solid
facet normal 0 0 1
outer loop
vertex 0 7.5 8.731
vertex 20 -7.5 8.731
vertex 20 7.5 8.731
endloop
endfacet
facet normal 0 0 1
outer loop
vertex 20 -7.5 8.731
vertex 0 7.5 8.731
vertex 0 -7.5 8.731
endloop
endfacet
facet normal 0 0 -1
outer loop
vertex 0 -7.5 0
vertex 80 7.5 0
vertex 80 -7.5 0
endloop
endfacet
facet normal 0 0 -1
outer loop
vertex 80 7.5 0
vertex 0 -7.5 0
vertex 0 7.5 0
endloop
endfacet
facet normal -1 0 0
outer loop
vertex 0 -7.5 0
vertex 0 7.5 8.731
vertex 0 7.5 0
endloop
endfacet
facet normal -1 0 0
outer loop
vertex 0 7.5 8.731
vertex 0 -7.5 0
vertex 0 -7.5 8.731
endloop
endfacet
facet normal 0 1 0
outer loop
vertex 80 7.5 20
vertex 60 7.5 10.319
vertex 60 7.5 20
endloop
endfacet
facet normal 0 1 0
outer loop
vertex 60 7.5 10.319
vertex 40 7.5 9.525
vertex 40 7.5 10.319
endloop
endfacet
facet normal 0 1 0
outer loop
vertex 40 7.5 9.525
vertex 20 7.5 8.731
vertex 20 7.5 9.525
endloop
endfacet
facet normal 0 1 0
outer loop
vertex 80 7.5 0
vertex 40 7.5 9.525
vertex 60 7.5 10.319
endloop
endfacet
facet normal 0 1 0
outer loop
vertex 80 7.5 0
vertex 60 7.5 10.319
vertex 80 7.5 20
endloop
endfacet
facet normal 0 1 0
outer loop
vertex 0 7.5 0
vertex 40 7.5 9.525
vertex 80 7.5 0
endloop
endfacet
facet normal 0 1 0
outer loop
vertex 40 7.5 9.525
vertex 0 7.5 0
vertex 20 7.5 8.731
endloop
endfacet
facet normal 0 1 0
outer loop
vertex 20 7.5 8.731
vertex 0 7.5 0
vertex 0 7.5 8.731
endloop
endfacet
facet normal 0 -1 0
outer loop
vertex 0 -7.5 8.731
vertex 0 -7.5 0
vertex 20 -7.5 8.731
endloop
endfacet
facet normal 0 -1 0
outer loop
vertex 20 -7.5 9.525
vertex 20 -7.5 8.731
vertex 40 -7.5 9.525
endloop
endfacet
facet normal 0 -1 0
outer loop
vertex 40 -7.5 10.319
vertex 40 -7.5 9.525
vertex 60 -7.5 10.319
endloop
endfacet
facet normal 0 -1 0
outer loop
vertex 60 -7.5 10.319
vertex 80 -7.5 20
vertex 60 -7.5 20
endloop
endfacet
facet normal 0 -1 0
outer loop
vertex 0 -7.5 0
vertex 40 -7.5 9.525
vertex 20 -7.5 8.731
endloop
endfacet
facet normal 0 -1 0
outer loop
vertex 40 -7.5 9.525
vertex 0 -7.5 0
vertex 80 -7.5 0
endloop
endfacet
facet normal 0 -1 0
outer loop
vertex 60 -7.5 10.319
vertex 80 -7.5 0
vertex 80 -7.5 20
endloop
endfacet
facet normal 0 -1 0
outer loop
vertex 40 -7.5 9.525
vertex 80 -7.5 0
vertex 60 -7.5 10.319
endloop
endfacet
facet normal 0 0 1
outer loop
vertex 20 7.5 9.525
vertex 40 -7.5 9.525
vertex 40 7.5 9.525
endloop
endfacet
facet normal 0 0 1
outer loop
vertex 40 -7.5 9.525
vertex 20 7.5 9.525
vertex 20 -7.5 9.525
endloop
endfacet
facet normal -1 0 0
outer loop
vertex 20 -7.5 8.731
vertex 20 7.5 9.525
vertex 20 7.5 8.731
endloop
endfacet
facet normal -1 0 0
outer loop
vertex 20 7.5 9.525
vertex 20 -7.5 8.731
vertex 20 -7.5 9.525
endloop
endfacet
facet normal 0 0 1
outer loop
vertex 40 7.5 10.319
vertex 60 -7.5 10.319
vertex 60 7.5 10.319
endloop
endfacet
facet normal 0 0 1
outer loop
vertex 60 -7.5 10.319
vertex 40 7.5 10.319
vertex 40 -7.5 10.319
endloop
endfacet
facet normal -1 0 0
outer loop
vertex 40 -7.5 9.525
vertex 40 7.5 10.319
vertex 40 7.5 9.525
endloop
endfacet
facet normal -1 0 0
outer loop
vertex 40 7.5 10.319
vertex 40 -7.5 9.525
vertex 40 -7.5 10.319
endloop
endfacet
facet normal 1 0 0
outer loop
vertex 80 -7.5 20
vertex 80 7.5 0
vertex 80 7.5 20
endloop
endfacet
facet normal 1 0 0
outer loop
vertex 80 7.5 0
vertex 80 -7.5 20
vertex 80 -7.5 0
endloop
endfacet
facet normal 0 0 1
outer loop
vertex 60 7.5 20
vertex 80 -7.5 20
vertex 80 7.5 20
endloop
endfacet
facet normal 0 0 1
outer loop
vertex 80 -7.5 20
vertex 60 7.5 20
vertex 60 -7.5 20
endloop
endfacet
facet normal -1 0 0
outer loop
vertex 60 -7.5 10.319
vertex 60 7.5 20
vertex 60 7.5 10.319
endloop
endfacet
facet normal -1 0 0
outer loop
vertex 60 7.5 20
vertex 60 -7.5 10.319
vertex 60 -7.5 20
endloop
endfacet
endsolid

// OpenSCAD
// file: ../lib/common.scad
// Shared helpers for the AR turntable part models.
//
// Every part file holds a parameter table P. Each row is:
//   [id, description, value_mm, evidence, display_unit, source_or_how_to_check]
//
// Evidence codes:
//   F  factory document          O  owner report
//   C  community drawing         S  industry standard
//   D  design choice             M  measured for this repository
//   DV derived from cited sources, not yet verified on a part. The source
//      column holds the derivation: the formula, each input with its source,
//      and how to verify. Drawn in blue. Needs a row in TO-CONFIRM.md whose
//      value starts with "Derived:". Change to M once measured.
//   PH placeholder: chosen only so the model has a shape. It is NOT a
//      measurement. Drawn in red. Replace it, and change the code, once it
//      is measured.
//
// Every part file also emits metadata naming the part page, the part, the
// version, the material and the tables it fits, each fit with its evidence:
//   ["part", "parts/counterweight.md"], ["part_name", "Counterweight"],
//   ["version", "XA brass weight, 1961 to 1979"], ["material", "Brass"],
//   ["fits", [["XA", "Fitted by AR", "XA service manual p. 4"], ["XB", "Unconfirmed", ""]]]
// The fit word is one of: Fitted by AR, Fits, Fits with a change, Does not
// fit, Unconfirmed. build.py prints these in the title block and writes the
// drawings table of cad/README.md from them.
// License: CC BY-SA 4.0. See LICENSE at the repository root.

IN = 25.4;      // one inch, in mm. All model geometry is in mm.
EPS = 0.01;     // overlap so boolean cuts do not leave zero-thickness skins
$fa = 2;
$fs = 0.1;

// Value of parameter `id` in table t.
function pv(t, id) = t[search([id], t)[0]][2];

// Print part data for cad/tools/build.py, which reads it from the console.
module emit(meta, params, dims = []) {
    echo(META = meta);
    for (row = params) echo(PARAM = row);
    for (row = dims) echo(DIM = row);
}

// Rounded rectangle prism: centered in XY, from z = 0 to z = h.
module rr_prism(l, w, h, r) {
    translate([-l / 2 + r, -w / 2, 0]) cube([l - 2 * r, w, h]);
    translate([-l / 2, -w / 2 + r, 0]) cube([l, w - 2 * r, h]);
    for (sx = [-1, 1], sy = [-1, 1])
        translate([sx * (l / 2 - r), sy * (w / 2 - r), 0]) cylinder(r = r, h = h);
}

// Slot along X: `c` is the distance between end-radius centers.
module slot_prism(c, w, h) {
    translate([-c / 2, -w / 2, 0]) cube([c, w, h]);
    for (sx = [-1, 1]) translate([sx * c / 2, 0, 0]) cylinder(d = w, h = h);
}
// main file
// Platter height gauge: a stepped block slid under the outer platter's edge.
//
// XB: the outer platter sits 3/8 in +/- 1/32 above the top plate (drawing 119,
// note 13), so the steps are 11/32, 3/8 and 13/32 in. The low step must pass
// under the platter and the high step must not.
// XA: 1/8 in with a heavy record on (XA service manual p. 2). No tolerance is
// given, so the XA gauge has one step at the nominal and a handle.
// Parameter IDs match TO-CONFIRM.md.
// License: CC BY-SA 4.0. See LICENSE at the repository root.
include <../lib/common.scad>

variant = 1;   // 1: XB, 2: XA
flat = false;

P = concat(variant == 1 ? [
    ["PG1", "Low step: must pass under the platter", 11 / 32 * IN, "F", "in", "XB drawing 119, note 13: 3/8 in minus 1/32"],
    ["PG2", "Nominal step", 3 / 8 * IN, "F", "in", "XB drawing 119, note 13"],
    ["PG3", "High step: must not pass", 13 / 32 * IN, "F", "in", "XB drawing 119, note 13: 3/8 in plus 1/32"],
] : [
    ["PG4", "Step: the platter rides this high with a heavy record on", 1 / 8 * IN, "F", "in", "XA service manual p. 2. No tolerance is given"],
], [
    ["PG5", "Step length, each", 20, "D", "mm", "Design choice"],
    ["PG6", "Block width", 15, "D", "mm", "Design choice: narrow enough to pass between the platter edge and the arm"],
    ["PG7", "Handle height", 20, "D", "mm", "Design choice"],
]);

steps = variant == 1 ? [pv(P, "PG1"), pv(P, "PG2"), pv(P, "PG3")] : [pv(P, "PG4")];
sl = pv(P, "PG5");
w = pv(P, "PG6");
hh = pv(P, "PG7");
n = len(steps);
total = (n + 1) * sl;

// Steps rise from x = 0; the handle is the last block.
module part() {
    for (i = [0 : n - 1])
        translate([i * sl, -w / 2, 0]) cube([sl + EPS, w, steps[i]]);
    translate([n * sl, -w / 2, 0]) cube([sl, w, hh]);
}

ids = variant == 1 ? ["PG1", "PG2", "PG3"] : ["PG4"];

emit(
    [
        ["id", variant == 1 ? "platter-height-gauge-xb-plastic" : "platter-height-gauge-xa-plastic"],
        ["title", variant == 1 ? "Platter height gauge, XB" : "Platter height gauge, XA"],
        ["status", "GEOMETRY COMPLETE"],
        ["part", "parts/platter-height-gauge.md"],
        ["part_name", "Platter height gauge"],
        ["version", variant == 1 ? "XB: steps at 11/32, 3/8 and 13/32 in" : "XA: one step at 1/8 in, no tolerance stated"],
        ["scope", "New setup tool from the factory setting of one table. AR supplied no such gauge"],
        ["material", "Rigid plastic, printed or milled; a stack of shim stock also works"],
        ["density", 1.2],
        ["fits", variant == 1
            ? [["XB", "Fits", "drawing 119, note 13"], ["XA", "Does not fit", "the XA platter rides 1/8 in, XA service manual p. 2"], ["AR77XB", "Unconfirmed", ""]]
            : [["XA", "Fits", "XA service manual p. 2"], ["XB", "Does not fit", "the XB platter rides 3/8 in, drawing 119 note 13"], ["AR77XB", "Unconfirmed", ""]]],
        ["make", "Print or mill. Check each step with calipers before use: a printer's first layer is often thick"],
        ["variants", [[1, "XB"], [2, "XA"]]],
        ["views", ["front", "top", "right", "iso"]],
        ["notes", variant == 1 ? [
            "Use: with the mat and a record on, slide the gauge under the outer platter's edge at several points. The 11/32 step must pass; the 13/32 step must not. Adjust the three suspension nuts (item 32) until it does all round.",
            "Drawing 119 does not say whether a record is on the platter for note 13. The XA manual says with a heavy record. Record what you did.",
        ] : [
            "Use: with a heavy record on, slide the 1/8 in step under the outer platter's edge at several points; it should just pass all round. Adjust the three suspension nuts until it does.",
            "No tolerance is given for the XA. Do not borrow the XB's 1/32 in.",
        ]],
    ],
    P,
    concat(
        [for (i = [0 : n - 1]) ["front", "v", [i * sl, 0, 0], [i * sl, 0, steps[i]], -9 - 8 * (n - 1 - i), ids[i]]],
        [
            ["front", "v", [total, 0, 0], [total, 0, hh], 17, "PG7"],
            ["front", "h", [0, 0, 0], [sl, 0, 0], -9, "PG5"],
            ["top", "v", [total, -w / 2, 0], [total, w / 2, 0], 9, "PG6"],
        ]
    )
);

if (flat) projection() part(); else part();
